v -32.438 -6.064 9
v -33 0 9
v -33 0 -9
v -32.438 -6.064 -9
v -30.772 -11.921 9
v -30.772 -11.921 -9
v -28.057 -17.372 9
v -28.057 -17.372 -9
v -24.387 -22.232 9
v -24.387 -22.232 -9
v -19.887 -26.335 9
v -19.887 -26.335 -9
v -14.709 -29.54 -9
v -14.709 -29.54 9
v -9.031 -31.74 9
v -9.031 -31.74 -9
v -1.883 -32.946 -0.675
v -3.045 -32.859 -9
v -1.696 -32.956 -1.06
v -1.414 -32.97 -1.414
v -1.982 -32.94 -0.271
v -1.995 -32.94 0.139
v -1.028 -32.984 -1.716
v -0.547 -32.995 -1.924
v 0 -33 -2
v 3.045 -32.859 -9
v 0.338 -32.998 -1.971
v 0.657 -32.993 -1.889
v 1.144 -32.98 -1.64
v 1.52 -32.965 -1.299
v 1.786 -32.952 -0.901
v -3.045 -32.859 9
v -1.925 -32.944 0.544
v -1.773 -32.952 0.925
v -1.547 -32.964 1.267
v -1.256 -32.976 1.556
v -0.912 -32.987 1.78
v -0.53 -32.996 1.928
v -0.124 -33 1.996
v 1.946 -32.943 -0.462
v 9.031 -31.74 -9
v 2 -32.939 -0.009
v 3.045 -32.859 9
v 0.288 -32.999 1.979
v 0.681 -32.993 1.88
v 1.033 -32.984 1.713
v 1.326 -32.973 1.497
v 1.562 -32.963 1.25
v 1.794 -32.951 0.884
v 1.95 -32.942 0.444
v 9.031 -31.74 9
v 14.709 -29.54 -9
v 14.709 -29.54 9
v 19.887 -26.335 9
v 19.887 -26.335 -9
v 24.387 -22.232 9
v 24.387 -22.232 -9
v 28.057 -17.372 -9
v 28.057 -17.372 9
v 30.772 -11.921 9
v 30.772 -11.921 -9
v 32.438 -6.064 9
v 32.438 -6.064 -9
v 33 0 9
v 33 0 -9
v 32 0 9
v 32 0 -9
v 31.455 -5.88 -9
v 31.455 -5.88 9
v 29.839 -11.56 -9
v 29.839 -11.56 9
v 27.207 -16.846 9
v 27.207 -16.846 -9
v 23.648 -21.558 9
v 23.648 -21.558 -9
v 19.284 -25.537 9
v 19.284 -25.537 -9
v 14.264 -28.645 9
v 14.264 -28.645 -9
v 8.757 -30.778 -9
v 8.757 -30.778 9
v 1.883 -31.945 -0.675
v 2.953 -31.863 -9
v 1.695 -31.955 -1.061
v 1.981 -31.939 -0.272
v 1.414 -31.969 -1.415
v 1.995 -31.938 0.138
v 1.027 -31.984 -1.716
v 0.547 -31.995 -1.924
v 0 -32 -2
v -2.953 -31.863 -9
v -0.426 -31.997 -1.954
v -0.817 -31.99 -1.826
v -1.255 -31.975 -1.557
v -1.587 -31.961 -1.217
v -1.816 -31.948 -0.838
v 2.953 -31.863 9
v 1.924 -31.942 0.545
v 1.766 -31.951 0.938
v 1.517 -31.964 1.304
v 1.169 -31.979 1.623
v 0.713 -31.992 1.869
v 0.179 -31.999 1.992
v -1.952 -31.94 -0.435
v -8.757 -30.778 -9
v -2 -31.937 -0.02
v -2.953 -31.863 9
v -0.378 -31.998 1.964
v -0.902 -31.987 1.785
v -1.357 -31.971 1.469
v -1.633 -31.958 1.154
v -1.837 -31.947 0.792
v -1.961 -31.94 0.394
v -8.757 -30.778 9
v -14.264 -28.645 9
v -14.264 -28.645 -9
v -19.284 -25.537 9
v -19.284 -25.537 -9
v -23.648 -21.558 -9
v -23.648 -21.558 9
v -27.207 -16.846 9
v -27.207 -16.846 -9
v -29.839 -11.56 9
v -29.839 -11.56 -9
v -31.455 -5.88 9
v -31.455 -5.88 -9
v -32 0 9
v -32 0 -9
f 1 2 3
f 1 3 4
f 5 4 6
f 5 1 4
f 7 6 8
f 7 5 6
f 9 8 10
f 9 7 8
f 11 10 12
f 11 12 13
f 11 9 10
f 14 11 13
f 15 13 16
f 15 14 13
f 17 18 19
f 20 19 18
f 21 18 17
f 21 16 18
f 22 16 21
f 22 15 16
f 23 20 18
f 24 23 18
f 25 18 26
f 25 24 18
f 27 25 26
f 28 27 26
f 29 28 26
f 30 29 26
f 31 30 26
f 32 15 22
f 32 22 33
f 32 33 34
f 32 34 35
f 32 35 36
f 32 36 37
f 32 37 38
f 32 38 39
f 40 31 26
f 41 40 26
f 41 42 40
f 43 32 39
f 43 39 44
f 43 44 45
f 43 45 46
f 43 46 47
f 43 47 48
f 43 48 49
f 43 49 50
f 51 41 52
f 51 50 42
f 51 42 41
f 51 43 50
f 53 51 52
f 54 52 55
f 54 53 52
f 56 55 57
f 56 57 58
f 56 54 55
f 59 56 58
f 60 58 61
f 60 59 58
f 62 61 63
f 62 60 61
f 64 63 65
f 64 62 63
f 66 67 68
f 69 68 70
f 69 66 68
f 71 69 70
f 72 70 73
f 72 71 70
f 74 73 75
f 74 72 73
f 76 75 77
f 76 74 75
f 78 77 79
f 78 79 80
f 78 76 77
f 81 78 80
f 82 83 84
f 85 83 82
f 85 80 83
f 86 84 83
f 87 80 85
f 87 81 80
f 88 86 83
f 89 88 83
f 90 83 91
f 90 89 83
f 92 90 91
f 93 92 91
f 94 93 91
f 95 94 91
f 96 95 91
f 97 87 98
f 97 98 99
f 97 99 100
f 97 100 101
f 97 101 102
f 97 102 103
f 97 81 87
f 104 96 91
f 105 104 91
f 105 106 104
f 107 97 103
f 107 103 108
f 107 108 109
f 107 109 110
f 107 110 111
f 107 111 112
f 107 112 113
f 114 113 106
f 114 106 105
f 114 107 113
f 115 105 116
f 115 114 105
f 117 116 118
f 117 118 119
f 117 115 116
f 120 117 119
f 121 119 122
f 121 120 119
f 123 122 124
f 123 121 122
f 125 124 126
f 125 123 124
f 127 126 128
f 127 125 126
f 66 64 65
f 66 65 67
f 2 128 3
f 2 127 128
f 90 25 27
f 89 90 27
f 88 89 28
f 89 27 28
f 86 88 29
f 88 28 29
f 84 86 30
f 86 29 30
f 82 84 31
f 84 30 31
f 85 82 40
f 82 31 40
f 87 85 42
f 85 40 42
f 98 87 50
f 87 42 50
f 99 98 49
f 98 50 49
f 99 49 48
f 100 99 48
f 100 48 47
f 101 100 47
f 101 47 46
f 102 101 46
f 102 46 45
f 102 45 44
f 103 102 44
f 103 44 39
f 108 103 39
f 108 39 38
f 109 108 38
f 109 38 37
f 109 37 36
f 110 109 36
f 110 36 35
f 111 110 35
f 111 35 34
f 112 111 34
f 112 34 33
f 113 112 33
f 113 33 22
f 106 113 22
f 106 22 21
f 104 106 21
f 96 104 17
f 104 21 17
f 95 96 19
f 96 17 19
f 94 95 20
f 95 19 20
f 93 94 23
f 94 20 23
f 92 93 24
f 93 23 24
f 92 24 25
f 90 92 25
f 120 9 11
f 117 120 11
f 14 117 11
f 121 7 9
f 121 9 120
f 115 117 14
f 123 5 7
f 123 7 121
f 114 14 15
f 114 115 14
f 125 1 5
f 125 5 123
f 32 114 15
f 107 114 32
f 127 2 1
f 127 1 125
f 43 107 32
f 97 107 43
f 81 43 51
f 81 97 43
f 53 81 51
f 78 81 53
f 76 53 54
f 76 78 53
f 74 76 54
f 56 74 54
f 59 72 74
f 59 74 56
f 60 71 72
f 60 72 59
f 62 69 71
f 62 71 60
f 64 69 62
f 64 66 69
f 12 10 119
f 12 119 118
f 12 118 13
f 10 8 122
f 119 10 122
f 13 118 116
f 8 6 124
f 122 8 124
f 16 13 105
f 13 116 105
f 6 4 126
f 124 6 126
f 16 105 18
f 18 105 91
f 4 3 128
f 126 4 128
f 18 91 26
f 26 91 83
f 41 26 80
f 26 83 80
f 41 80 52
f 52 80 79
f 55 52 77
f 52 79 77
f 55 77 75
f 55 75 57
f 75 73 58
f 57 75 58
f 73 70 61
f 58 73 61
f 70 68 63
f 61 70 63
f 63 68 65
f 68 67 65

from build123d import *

# Parameters (mm, degrees)
SALIENTE_EXTRUIR1_DEPTH = 9
CROQUIS2_R              = 2
CORTAR_EXTRUIR1_DEPTH   = 10


with BuildPart() as part:
    # Croquis1 → Saliente-Extruir1 (new, symmetric)
    with BuildSketch(Plane.XY):
        with BuildLine():
            Line((-32, 0), (-33, 0))
            ThreePointArc((-33, 0), (0, -33), (33, 0))
            Line((33, 0), (32, 0))
            ThreePointArc((32, 0), (0, -32), (-32, 0))
        make_face()
    extrude(amount=SALIENTE_EXTRUIR1_DEPTH, both=True)

    # Croquis2 → Cortar-Extruir1 (cut)
    with BuildSketch(Plane.XZ.offset(33)):
        with Locations(Location((0, 0, 0), (0, 0, 270))):
            Circle(CROQUIS2_R)
    extrude(amount=-CORTAR_EXTRUIR1_DEPTH, mode=Mode.SUBTRACT)


solid = part.part
